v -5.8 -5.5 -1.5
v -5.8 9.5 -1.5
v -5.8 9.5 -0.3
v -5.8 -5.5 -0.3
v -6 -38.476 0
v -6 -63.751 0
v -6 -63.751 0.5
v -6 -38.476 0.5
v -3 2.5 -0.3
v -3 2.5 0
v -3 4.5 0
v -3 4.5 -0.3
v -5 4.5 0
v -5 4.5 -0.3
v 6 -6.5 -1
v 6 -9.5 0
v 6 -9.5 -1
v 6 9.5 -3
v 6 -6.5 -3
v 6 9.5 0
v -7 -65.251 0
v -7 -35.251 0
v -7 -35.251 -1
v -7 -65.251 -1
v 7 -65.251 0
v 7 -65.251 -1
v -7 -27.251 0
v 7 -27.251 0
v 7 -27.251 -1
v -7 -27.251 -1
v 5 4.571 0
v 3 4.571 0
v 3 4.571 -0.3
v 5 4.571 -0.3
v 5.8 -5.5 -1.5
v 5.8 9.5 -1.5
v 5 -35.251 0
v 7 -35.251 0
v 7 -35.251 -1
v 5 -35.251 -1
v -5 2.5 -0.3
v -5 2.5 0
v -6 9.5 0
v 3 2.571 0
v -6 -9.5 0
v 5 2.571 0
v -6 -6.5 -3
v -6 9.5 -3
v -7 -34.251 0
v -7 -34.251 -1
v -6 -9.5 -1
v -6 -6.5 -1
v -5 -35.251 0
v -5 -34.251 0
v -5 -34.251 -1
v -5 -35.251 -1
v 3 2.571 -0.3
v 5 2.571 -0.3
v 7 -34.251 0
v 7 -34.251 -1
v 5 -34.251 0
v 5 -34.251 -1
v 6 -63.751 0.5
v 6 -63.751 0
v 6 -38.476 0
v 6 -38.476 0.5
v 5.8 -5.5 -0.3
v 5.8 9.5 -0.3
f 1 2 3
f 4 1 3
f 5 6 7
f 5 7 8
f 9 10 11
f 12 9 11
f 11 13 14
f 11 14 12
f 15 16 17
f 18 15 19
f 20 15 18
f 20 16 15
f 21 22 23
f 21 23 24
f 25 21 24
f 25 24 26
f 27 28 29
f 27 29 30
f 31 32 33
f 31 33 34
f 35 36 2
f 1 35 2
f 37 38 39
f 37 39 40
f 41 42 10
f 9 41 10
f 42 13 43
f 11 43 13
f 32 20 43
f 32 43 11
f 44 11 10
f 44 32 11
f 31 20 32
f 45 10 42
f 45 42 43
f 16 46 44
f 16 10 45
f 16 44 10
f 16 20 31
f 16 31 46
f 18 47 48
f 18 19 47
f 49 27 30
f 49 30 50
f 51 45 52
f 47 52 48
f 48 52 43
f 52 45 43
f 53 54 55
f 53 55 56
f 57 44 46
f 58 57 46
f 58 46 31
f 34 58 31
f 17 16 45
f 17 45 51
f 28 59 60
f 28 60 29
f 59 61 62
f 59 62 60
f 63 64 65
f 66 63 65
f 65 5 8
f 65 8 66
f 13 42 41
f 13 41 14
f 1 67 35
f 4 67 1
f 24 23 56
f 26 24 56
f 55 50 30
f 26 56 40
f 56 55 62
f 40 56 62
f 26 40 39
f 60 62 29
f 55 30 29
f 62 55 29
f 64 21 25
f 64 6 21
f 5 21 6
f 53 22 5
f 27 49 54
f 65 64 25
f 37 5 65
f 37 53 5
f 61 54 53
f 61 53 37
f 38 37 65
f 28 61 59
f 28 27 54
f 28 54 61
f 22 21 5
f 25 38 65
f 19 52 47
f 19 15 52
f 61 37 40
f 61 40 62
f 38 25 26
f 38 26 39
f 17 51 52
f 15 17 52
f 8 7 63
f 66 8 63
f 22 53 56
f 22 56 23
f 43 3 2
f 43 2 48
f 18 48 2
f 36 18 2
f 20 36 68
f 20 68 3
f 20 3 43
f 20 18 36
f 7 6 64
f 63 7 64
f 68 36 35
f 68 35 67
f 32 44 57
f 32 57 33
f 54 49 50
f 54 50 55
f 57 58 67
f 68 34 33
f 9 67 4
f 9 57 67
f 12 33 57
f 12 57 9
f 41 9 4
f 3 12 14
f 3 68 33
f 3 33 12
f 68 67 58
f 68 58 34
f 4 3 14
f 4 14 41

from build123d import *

# Parameters (mm, degrees)
F2_DEPTH  = 6
F4_DEPTH  = 1
F6_W      = 2
F6_H      = 2
F7_DEPTH  = 1
F9_W      = 11.6
F9_H      = 1.2
F10_DEPTH = 15
F12_W     = 12
F12_H     = 25.2746624606
F13_DEPTH = 0.5


with BuildPart() as f2:
    # F1 (on Right) → F2 (new body, symmetric)
    with BuildSketch(Plane.YZ):
        Polygon((9.5, -3), (9.5, 0), (-9.5, 0), (-9.5, -1), (-6.5, -1), (-6.5, -3), align=None)
    extrude(amount=F2_DEPTH, both=True)

    # F6 (on offset) → F7 (cut)
    with BuildSketch(Plane.XY):
        with Locations((-4, 3.5)):
            Rectangle(F6_W, F6_H)
        with Locations((4, 3.5710524619)):
            Rectangle(F6_W, F6_H)
    extrude(amount=-F7_DEPTH, mode=Mode.SUBTRACT)

    # F9 (on offset) → F10 (cut)
    with BuildSketch(Plane(origin=(0, 9.5, 0), x_dir=(-1, 0, 0), z_dir=(0, 1, 0))):
        with Locations((0, -0.9)):
            Rectangle(F9_W, F9_H)
    extrude(amount=-F10_DEPTH, mode=Mode.SUBTRACT)


with BuildPart() as f4:
    # F3 (on Top) → F4 (new body)
    with BuildSketch(Plane.XY):
        Polygon((7, -27.2508510042), (-7, -27.2508510042), (-7, -34.2508510042), (-5, -34.2508510042), (-5, -35.2508510042), (-7, -35.2508510042), (-7, -65.2508510042), (7, -65.2508510042), (7, -35.2508510042), (5, -35.2508510042), (5, -34.2508510042), (7, -34.2508510042), align=None)
    extrude(amount=-F4_DEPTH)

    # F12 (on offset) → F13 (join)
    with BuildSketch(Plane.XY):
        with Locations((0, -51.113519774)):
            Rectangle(F12_W, F12_H)
    extrude(amount=F13_DEPTH)


solid = Compound([f2.part, f4.part])
